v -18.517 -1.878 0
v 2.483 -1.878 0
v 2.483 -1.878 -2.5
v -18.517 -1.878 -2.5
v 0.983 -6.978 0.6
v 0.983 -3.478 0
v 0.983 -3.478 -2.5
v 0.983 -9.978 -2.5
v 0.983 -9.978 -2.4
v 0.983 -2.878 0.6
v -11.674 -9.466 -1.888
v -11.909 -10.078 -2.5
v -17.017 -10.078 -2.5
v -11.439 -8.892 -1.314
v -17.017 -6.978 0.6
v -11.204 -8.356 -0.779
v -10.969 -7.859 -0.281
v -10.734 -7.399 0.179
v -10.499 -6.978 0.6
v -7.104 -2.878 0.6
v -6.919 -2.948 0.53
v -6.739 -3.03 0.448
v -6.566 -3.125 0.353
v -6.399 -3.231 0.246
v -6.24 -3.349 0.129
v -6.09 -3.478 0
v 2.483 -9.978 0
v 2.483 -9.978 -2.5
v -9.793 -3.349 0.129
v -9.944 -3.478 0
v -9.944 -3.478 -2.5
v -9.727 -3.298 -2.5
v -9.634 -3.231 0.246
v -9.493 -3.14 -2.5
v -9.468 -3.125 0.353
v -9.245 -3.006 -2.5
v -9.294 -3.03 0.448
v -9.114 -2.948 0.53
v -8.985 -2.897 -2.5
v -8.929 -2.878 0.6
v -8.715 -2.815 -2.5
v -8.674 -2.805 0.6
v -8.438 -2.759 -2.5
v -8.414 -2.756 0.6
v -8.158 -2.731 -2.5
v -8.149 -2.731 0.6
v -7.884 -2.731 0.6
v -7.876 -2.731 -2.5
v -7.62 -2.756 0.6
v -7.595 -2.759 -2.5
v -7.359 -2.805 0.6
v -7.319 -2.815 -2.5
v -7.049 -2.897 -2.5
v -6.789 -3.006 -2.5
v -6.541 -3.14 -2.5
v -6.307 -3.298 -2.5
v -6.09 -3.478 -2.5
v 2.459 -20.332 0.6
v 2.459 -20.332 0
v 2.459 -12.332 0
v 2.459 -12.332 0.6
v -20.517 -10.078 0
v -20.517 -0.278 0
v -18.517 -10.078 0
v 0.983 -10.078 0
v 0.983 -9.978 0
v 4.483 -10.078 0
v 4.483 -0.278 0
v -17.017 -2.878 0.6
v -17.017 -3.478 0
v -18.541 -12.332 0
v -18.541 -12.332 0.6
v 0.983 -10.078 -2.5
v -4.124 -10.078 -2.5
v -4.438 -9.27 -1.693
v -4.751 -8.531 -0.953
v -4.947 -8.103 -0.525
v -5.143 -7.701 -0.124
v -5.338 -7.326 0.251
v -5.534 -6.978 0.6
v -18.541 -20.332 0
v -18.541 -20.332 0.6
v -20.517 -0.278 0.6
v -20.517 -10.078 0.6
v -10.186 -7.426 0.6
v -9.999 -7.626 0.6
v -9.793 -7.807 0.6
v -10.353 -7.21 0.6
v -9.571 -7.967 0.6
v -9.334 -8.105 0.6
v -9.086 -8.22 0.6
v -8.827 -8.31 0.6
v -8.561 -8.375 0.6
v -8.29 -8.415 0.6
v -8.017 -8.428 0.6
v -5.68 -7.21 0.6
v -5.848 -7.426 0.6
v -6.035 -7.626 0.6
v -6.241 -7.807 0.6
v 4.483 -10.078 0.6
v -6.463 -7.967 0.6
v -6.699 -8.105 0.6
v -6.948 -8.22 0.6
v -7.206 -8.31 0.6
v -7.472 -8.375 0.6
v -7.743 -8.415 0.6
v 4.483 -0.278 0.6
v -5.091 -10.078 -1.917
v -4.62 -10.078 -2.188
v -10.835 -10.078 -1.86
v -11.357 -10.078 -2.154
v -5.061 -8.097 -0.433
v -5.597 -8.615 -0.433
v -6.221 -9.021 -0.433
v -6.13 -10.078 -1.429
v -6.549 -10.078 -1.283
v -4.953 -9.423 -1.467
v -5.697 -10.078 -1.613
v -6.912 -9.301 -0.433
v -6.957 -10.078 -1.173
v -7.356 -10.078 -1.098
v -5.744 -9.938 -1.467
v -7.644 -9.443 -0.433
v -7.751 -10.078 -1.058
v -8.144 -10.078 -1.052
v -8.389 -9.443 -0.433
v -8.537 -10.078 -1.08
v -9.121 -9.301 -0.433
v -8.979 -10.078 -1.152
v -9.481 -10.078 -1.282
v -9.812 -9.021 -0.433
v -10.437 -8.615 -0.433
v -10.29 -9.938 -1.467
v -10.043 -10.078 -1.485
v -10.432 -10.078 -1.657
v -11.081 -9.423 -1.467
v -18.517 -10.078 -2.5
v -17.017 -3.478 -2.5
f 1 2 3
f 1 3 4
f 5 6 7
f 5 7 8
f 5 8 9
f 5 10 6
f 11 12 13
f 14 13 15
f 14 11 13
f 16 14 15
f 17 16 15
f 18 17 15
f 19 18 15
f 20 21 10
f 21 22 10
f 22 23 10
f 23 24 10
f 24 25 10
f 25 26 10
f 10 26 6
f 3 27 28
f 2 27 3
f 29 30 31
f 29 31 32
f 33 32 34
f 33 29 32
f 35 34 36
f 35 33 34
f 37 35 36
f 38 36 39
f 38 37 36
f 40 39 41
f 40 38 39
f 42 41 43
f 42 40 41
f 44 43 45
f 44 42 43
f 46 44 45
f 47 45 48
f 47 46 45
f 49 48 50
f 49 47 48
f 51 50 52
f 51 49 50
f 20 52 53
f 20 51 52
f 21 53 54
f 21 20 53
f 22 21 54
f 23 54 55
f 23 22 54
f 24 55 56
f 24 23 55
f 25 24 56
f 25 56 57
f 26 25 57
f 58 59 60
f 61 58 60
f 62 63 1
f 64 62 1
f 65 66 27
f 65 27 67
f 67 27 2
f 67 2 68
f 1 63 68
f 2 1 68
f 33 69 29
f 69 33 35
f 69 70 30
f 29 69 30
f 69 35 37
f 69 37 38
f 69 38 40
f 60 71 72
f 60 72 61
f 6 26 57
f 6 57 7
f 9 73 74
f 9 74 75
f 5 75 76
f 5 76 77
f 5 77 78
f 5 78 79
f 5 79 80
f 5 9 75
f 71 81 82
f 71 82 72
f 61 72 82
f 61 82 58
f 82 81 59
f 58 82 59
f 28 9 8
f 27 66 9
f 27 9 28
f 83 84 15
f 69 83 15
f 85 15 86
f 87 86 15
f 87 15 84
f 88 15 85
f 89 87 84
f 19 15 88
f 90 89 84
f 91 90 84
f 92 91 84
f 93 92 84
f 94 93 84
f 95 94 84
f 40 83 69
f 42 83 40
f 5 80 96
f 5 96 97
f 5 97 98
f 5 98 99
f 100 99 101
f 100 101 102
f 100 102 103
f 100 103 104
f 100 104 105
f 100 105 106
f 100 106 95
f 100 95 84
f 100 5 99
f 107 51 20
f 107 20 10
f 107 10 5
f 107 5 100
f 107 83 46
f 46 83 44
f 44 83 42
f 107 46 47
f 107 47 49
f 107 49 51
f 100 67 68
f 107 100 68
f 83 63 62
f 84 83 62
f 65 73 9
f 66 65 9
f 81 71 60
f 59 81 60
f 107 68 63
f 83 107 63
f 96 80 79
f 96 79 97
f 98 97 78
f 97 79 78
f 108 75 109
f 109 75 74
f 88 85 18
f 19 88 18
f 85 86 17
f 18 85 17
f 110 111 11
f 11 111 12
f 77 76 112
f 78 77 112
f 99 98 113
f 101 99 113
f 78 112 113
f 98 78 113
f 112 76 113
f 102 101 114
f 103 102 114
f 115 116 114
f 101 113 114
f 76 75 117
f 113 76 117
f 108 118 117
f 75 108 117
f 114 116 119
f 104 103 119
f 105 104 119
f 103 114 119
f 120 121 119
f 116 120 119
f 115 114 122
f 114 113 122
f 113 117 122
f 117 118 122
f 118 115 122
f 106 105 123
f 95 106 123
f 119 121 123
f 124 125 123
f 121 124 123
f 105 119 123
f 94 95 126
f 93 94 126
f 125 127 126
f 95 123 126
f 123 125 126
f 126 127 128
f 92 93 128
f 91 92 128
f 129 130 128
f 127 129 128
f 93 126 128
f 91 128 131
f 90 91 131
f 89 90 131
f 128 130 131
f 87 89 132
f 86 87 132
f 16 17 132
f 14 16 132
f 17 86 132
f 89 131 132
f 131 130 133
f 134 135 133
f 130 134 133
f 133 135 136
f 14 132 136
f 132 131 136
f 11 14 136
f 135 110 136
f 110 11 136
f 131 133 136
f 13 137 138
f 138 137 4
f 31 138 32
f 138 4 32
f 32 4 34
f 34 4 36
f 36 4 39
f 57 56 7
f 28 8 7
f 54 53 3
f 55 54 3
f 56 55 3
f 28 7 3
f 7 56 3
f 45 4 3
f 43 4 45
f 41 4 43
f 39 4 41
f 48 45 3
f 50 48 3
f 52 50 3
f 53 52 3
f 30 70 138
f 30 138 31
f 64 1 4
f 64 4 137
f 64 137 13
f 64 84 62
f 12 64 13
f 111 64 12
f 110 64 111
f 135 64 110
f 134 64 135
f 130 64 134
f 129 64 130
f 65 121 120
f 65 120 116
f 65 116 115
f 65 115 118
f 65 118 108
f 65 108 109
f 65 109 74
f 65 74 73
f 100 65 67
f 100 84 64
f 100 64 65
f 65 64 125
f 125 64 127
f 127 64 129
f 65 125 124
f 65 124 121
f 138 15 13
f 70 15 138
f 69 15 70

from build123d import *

# Parameters (mm, degrees)
F0_W         = 18
F0_H         = 1.6
F1_DEPTH     = 0.6
F0_W_2       = 21
F0_H_2       = 8
F2_DEPTH     = 4
F3_T4_DEPTH  = 18.3473034272
F3_T9_DEPTH  = 18.3473034272
F3_T14_ANGLE = 359.64
F4_SIZE      = 0.59999
F5_DEPTH     = 2.5


# Not quite as in the source:
# - a fillet or chamfer that OpenCascade refuses, or shapes differently, is made with other operations: its cross-section is extruded or revolved along the edge and cut away or added
# - a fillet or chamfer is up to 0.001 mm smaller than in the source, because OpenCascade refuses the exact size
# - a feature of the source that left no trace in its solid (it failed there, or was rolled back) is left out


with BuildPart() as f1:
    # F0 (on Top) → F1 (new body)
    with BuildSketch(Plane.XY):
        Polygon((-17.0167625099, -0.2778713822), (-20.5167625099, -0.2778713822), (-20.5167625099, -10.0778713822), (-18.5167625099, -10.0778713822), (-18.5167625099, -1.8778713822), (-17.0167625099, -1.8778713822), align=None)
        with Locations((-8.0167625099, -1.0778713822)):
            Rectangle(F0_W, F0_H)
        Polygon((4.4832374901, -0.2778713822), (0.9832374901, -0.2778713822), (0.9832374901, -1.8778713822), (2.4832374901, -1.8778713822), (2.4832374901, -9.9778713822), (0.9832374901, -9.9778713822), (0.9832374901, -10.0778713822), (4.4832374901, -10.0778713822), align=None)
        Polygon((-17.0167625099, -3.4778713822), (-17.0167625099, -1.8778713822), (-18.5167625099, -1.8778713822), (-18.5167625099, -10.0778713822), (-17.0167625099, -10.0778713822), (-17.0167625099, -6.9778713822), align=None)
        with BuildLine():
            Line((-17.0167625099, -6.9778713822), (-17.0167625099, -10.0778713822))
            Line((-17.0167625099, -10.0778713822), (0.9832374901, -10.0778713822))
            Line((0.9832374901, -10.0778713822), (0.9832374901, -9.9778713822))
            Line((0.9832374901, -9.9778713822), (0.9832374901, -6.9778713822))
            Line((0.9832374901, -6.9778713822), (-5.5343241925, -6.9778713822))
            ThreePointArc((-5.5343241925, -6.9778713822), (-8.0167625099, -8.4278713822), (-10.4992008274, -6.9778713822))
            Line((-10.4992008274, -6.9778713822), (-17.0167625099, -6.9778713822))
        make_face()
        Polygon((2.4832374901, -1.8778713822), (0.9832374901, -1.8778713822), (0.9832374901, -3.4778713822), (0.9832374901, -6.9778713822), (0.9832374901, -9.9778713822), (2.4832374901, -9.9778713822), align=None)
        with BuildLine():
            Line((0.9832374901, -1.8778713822), (-17.0167625099, -1.8778713822))
            Line((-17.0167625099, -1.8778713822), (-17.0167625099, -3.4778713822))
            Line((-17.0167625099, -3.4778713822), (-9.9435473967, -3.4778713822))
            ThreePointArc((-9.9435473967, -3.4778713822), (-8.0167625099, -2.7278713822), (-6.0899776231, -3.4778713822))
            Line((-6.0899776231, -3.4778713822), (0.9832374901, -3.4778713822))
            Line((0.9832374901, -3.4778713822), (0.9832374901, -1.8778713822))
        make_face()
    extrude(amount=F1_DEPTH)

    # F0 (on Top) → F2 (join)
    with BuildSketch(Plane.XY):
        with BuildLine():
            Line((-17.0167625099, -6.9778713822), (-17.0167625099, -10.0778713822))
            Line((-17.0167625099, -10.0778713822), (0.9832374901, -10.0778713822))
            Line((0.9832374901, -10.0778713822), (0.9832374901, -9.9778713822))
            Line((0.9832374901, -9.9778713822), (0.9832374901, -6.9778713822))
            Line((0.9832374901, -6.9778713822), (-5.5343241925, -6.9778713822))
            ThreePointArc((-5.5343241925, -6.9778713822), (-8.0167625099, -8.4278713822), (-10.4992008274, -6.9778713822))
            Line((-10.4992008274, -6.9778713822), (-17.0167625099, -6.9778713822))
        make_face()
    extrude(amount=-F2_DEPTH)

    # F3: chamfer of 4.6 on 3 edges, made by hand


with BuildPart() as f1b:
    # F0 (on Top) → F1, piece 2 (new body)
    with BuildSketch(Plane.XY):
        with Locations((-8.0406878591, -16.3323699534)):
            Rectangle(F0_W_2, F0_H_2)
    extrude(amount=F1_DEPTH)


with BuildPart() as f3_tool2:
    # F3_s3 → F3_t4 (new body)
    with BuildSketch(Plane.YZ.offset(1.3305409172)):
        Polygon((-11.5778713822, -4), (-6.9778713822, 0.6), (-6.9778713822, -4), align=None)
    extrude(amount=-F3_T4_DEPTH)

    split(bisect_by=Plane.YZ.offset(0.9832374901), keep=Keep.BOTTOM)


with BuildPart() as f1_1:
    add(f1.part)

    # F3_t1: cut F3_tool2
    add(f3_tool2.part, mode=Mode.SUBTRACT)


with BuildPart() as f3_tool7:
    # F3_s8 → F3_t9 (new body)
    with BuildSketch(Plane.YZ.offset(0.9832374901)):
        Polygon((-11.5778713822, -4), (-6.9778713822, 0.6), (-6.9778713822, -4), align=None)
    extrude(amount=-F3_T9_DEPTH)

    split(bisect_by=Plane.YZ.offset(-17.0167625099), keep=Keep.TOP)


with BuildPart() as f1_2:
    add(f1_1.part)

    # F3_t6: cut F3_tool7
    add(f3_tool7.part, mode=Mode.SUBTRACT)


with BuildPart() as f3_tool12:
    # F3_s13 → F3_t14 (revolve)
    with BuildSketch(Plane(origin=(-7.9991601035, 0.0251301853, 0), x_dir=(0, 0, 1), z_dir=(-0.9999950652, 0.0031415875, 0))):
        Polygon((0.6, -2.7530292173), (-4, 1.8469707827), (-4, -2.7530292173), align=None)
    revolve(axis=Axis((-8.0167625099, -5.5778713822, -4), (0, 0, -1)), revolution_arc=F3_T14_ANGLE)

    split(bisect_by=Plane.XZ.offset(3.4778713822), keep=Keep.TOP)


with BuildPart() as f1_3:
    add(f1_2.part)

    # F3_t11: cut F3_tool12
    add(f3_tool12.part, mode=Mode.SUBTRACT)

    # F4 (size 0.6 in the source; OpenCascade refuses exactly that, so slightly less here)
    f4_edges = [f1_3.edges().sort_by_distance(p)[0] for p in [
        (-13.480155, -3.477871, 0.6),
        (-2.55337, -3.477871, 0.6),
    ]]
    chamfer(f4_edges, length=F4_SIZE)

    # F0 (on Top) → F5 (join)
    with BuildSketch(Plane.XY):
        Polygon((-17.0167625099, -3.4778713822), (-17.0167625099, -1.8778713822), (-18.5167625099, -1.8778713822), (-18.5167625099, -10.0778713822), (-17.0167625099, -10.0778713822), (-17.0167625099, -6.9778713822), align=None)
        with BuildLine():
            Line((0.9832374901, -1.8778713822), (-17.0167625099, -1.8778713822))
            Line((-17.0167625099, -1.8778713822), (-17.0167625099, -3.4778713822))
            Line((-17.0167625099, -3.4778713822), (-9.9435473967, -3.4778713822))
            ThreePointArc((-9.9435473967, -3.4778713822), (-8.0167625099, -2.7278713822), (-6.0899776231, -3.4778713822))
            Line((-6.0899776231, -3.4778713822), (0.9832374901, -3.4778713822))
            Line((0.9832374901, -3.4778713822), (0.9832374901, -1.8778713822))
        make_face()
        Polygon((2.4832374901, -1.8778713822), (0.9832374901, -1.8778713822), (0.9832374901, -3.4778713822), (0.9832374901, -6.9778713822), (0.9832374901, -9.9778713822), (2.4832374901, -9.9778713822), align=None)
    extrude(amount=-F5_DEPTH)


solid = Compound([f1b.part, f1_3.part])
